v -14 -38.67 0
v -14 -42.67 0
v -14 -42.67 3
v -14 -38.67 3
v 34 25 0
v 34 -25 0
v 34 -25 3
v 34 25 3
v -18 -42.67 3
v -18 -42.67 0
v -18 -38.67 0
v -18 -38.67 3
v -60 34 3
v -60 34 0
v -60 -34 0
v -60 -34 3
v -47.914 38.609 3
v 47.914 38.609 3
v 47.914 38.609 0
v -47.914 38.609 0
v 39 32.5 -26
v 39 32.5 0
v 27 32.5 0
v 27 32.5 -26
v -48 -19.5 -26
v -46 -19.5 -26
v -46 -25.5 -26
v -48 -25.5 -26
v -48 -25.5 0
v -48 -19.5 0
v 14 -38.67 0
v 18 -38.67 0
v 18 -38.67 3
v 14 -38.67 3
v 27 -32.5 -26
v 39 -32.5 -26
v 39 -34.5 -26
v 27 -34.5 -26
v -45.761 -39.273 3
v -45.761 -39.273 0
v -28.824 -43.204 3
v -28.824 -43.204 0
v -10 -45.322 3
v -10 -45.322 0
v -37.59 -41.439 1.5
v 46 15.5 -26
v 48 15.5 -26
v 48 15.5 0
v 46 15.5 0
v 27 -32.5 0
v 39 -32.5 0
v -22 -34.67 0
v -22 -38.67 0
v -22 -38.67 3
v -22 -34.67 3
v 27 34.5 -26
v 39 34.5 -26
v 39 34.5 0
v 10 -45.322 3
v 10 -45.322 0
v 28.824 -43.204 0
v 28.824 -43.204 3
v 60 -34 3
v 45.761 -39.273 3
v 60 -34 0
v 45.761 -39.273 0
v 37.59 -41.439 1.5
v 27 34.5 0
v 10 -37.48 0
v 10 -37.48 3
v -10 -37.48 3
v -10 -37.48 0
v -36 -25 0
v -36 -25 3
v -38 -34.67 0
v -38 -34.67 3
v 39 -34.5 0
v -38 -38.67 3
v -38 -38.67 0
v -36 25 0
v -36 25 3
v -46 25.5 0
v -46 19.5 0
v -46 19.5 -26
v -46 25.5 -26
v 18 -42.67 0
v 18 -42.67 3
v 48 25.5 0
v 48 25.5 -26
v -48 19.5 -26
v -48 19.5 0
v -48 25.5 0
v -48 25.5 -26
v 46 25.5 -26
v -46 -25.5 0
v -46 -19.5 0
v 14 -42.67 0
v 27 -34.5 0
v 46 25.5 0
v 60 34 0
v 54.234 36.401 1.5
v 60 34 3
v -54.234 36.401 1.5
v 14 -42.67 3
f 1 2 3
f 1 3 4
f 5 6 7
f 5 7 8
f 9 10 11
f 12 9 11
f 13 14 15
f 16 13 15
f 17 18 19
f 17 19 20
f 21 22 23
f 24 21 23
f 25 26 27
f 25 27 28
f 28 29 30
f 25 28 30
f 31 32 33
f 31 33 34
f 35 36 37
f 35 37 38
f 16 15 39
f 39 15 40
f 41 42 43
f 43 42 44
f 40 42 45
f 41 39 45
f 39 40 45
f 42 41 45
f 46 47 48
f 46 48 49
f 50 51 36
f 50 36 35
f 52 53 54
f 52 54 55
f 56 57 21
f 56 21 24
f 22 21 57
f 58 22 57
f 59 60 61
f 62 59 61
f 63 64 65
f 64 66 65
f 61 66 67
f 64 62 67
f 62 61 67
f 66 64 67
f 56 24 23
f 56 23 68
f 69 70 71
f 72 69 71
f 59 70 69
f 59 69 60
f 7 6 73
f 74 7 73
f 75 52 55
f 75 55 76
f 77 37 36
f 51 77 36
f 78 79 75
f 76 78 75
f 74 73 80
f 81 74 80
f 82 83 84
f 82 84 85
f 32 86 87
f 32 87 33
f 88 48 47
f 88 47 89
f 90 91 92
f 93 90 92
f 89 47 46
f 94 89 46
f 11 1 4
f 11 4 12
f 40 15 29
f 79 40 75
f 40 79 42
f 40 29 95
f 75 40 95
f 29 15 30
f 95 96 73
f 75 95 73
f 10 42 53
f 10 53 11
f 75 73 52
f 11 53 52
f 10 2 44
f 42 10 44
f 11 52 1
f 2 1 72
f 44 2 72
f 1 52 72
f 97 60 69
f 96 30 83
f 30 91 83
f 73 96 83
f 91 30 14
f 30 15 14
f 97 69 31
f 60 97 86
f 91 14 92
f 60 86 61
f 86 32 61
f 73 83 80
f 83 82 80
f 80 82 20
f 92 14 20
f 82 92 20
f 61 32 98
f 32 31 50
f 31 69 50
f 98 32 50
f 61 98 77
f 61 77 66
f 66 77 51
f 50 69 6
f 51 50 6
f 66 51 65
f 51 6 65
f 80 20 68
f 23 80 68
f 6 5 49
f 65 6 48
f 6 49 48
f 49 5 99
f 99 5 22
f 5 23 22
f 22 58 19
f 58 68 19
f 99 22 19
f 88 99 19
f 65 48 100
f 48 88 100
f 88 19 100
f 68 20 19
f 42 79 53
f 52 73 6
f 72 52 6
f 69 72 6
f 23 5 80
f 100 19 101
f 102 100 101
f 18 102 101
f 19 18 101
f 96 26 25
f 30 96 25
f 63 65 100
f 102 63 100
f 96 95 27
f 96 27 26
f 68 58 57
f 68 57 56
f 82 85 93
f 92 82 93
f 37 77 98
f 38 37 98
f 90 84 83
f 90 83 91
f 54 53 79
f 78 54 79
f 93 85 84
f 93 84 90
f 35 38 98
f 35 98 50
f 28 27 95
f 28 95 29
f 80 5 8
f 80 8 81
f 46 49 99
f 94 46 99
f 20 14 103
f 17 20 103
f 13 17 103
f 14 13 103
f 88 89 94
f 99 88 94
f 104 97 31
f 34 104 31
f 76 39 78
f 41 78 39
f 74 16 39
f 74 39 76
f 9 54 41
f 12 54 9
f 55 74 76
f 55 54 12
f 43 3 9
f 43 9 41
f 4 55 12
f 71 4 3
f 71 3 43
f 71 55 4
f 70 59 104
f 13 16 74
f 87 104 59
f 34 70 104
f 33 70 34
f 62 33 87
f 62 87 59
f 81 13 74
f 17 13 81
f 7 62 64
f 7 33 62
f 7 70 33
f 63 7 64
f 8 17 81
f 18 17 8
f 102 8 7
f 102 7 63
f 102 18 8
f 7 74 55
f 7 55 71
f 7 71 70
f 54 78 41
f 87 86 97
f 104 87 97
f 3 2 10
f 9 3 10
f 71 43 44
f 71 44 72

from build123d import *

# Parameters (mm, degrees)
EXTRUDE_1_DEPTH           = 3
SKETCH_3_W                = 12
SKETCH_3_H                = 2
SKETCH_3_W_2              = 2
SKETCH_3_H_2              = 6
SKETCH_3_H_3              = 10
EXTRUDE_2_DEPTH           = 26
CUT_EXTRUDE_5_DEPTH       = 80.722804771
CUT_EXTRUDE_5_DEPTH_BACK  = 3
SKETCH_5_W                = 4
SKETCH_5_H                = 4
SKETCH_5_W_2              = 16
CUT_EXTRUDE_6_DEPTH       = 3
SKETCH_6_W                = 70
SKETCH_6_H                = 50
CUT_EXTRUDE_7_DEPTH       = 10
CUT_EXTRUDE_10_DEPTH      = 80.722804771
CUT_EXTRUDE_10_DEPTH_BACK = 3


with BuildPart() as part:
    # 草图1 → 凸台-拉伸1 (new body)
    with BuildSketch(Plane.XY):
        with BuildLine():
            Line((-60, 34), (-60, -34))
            add(Edge.make_bspline(
                [(-60, -34), (0, -61.168399395), (60, -34)],
                knots=[0.841357477, 0.841357477, 0.841357477, 2.300235176, 2.300235176, 2.300235176], degree=2, weights=[1, 0.745548499, 1]))
            Line((60, -34), (60, 34))
            add(Edge.make_bspline(
                [(60, 34), (0, 61.168399395), (-60, 34)],
                knots=[3.982950131, 3.982950131, 3.982950131, 5.44182783, 5.44182783, 5.44182783], degree=2, weights=[1, 0.745548499, 1]))
        make_face()
    extrude(amount=EXTRUDE_1_DEPTH)

    # 草图3 → 凸台-拉伸2 (add)
    with BuildSketch(Plane(origin=(0, 0, 0), x_dir=(-1, 0, 0), z_dir=(0, 0, -1))):
        with Locations((-33, -33.5)):
            Rectangle(SKETCH_3_W, SKETCH_3_H)
        with Locations((47, -22.5)):
            Rectangle(SKETCH_3_W_2, SKETCH_3_H_2)
        with Locations((47, 22.5)):
            Rectangle(SKETCH_3_W_2, SKETCH_3_H_2)
        with Locations((-33, 33.5)):
            Rectangle(SKETCH_3_W, SKETCH_3_H)
        with Locations((-47, 20.5)):
            Rectangle(SKETCH_3_W_2, SKETCH_3_H_3)
    extrude(amount=EXTRUDE_2_DEPTH)

    # 草图4 → 切除-拉伸5 (cut, two sides: drawn at the far end of the back side and taken through both)
    with BuildSketch(Plane(origin=(0, 0, 0), x_dir=(-1, 0, 0), z_dir=(0, 0, -1)).offset(-CUT_EXTRUDE_5_DEPTH_BACK)):
        Polygon((-10, -284.821306472), (-10, -45.321810815), (-10, -37.47951977), (10, -37.47951977), (10, -45.321810815), (10, -284.821306472), (10, -763.820297787), (-10, -763.820297787), align=None)
    extrude(amount=CUT_EXTRUDE_5_DEPTH + CUT_EXTRUDE_5_DEPTH_BACK, mode=Mode.SUBTRACT)

    # 草图5 → 切除-拉伸6 (cut)
    with BuildSketch(Plane(origin=(0, 0, 0), x_dir=(-1, 0, 0), z_dir=(0, 0, -1))):
        with Locations((-16, -40.670164979)):
            Rectangle(SKETCH_5_W, SKETCH_5_H)
        with Locations((30, -36.670164979)):
            Rectangle(SKETCH_5_W_2, SKETCH_5_H)
        with Locations((16, -40.670164979)):
            Rectangle(SKETCH_5_W, SKETCH_5_H)
    extrude(amount=-CUT_EXTRUDE_6_DEPTH, mode=Mode.SUBTRACT)

    # 草图6 → 切除-拉伸7 (cut)
    with BuildSketch(Plane(origin=(0, 0, 0), x_dir=(-1, 0, 0), z_dir=(0, 0, -1))):
        with Locations((1, 1.9417e-05)):
            Rectangle(SKETCH_6_W, SKETCH_6_H)
    extrude(amount=-CUT_EXTRUDE_7_DEPTH, mode=Mode.SUBTRACT)

    # 草图7 → 切除-拉伸10 (cut, two sides: drawn at the far end of the back side and taken through both)
    with BuildSketch(Plane(origin=(0, 0, 0), x_dir=(-1, 0, 0), z_dir=(0, 0, -1)).offset(-CUT_EXTRUDE_10_DEPTH_BACK)):
        with BuildLine():
            Line((-47.914442952, 38.608895735), (-0.047490379, 38.608895735))
            Line((-0.047490379, 38.608895735), (47.914442952, 38.608895735))
            add(Edge.make_bspline(
                [(-47.914442952, 38.608895735), (0, 53.86648698), (47.914442952, 38.608895735)],
                knots=[4.161758339, 4.161758339, 4.161758339, 5.263019622, 5.263019622, 5.263019622], degree=2, weights=[0.945270908, 0.800277591, 0.945270908]))
        make_face()
    extrude(amount=CUT_EXTRUDE_10_DEPTH + CUT_EXTRUDE_10_DEPTH_BACK, mode=Mode.SUBTRACT)


solid = part.part
